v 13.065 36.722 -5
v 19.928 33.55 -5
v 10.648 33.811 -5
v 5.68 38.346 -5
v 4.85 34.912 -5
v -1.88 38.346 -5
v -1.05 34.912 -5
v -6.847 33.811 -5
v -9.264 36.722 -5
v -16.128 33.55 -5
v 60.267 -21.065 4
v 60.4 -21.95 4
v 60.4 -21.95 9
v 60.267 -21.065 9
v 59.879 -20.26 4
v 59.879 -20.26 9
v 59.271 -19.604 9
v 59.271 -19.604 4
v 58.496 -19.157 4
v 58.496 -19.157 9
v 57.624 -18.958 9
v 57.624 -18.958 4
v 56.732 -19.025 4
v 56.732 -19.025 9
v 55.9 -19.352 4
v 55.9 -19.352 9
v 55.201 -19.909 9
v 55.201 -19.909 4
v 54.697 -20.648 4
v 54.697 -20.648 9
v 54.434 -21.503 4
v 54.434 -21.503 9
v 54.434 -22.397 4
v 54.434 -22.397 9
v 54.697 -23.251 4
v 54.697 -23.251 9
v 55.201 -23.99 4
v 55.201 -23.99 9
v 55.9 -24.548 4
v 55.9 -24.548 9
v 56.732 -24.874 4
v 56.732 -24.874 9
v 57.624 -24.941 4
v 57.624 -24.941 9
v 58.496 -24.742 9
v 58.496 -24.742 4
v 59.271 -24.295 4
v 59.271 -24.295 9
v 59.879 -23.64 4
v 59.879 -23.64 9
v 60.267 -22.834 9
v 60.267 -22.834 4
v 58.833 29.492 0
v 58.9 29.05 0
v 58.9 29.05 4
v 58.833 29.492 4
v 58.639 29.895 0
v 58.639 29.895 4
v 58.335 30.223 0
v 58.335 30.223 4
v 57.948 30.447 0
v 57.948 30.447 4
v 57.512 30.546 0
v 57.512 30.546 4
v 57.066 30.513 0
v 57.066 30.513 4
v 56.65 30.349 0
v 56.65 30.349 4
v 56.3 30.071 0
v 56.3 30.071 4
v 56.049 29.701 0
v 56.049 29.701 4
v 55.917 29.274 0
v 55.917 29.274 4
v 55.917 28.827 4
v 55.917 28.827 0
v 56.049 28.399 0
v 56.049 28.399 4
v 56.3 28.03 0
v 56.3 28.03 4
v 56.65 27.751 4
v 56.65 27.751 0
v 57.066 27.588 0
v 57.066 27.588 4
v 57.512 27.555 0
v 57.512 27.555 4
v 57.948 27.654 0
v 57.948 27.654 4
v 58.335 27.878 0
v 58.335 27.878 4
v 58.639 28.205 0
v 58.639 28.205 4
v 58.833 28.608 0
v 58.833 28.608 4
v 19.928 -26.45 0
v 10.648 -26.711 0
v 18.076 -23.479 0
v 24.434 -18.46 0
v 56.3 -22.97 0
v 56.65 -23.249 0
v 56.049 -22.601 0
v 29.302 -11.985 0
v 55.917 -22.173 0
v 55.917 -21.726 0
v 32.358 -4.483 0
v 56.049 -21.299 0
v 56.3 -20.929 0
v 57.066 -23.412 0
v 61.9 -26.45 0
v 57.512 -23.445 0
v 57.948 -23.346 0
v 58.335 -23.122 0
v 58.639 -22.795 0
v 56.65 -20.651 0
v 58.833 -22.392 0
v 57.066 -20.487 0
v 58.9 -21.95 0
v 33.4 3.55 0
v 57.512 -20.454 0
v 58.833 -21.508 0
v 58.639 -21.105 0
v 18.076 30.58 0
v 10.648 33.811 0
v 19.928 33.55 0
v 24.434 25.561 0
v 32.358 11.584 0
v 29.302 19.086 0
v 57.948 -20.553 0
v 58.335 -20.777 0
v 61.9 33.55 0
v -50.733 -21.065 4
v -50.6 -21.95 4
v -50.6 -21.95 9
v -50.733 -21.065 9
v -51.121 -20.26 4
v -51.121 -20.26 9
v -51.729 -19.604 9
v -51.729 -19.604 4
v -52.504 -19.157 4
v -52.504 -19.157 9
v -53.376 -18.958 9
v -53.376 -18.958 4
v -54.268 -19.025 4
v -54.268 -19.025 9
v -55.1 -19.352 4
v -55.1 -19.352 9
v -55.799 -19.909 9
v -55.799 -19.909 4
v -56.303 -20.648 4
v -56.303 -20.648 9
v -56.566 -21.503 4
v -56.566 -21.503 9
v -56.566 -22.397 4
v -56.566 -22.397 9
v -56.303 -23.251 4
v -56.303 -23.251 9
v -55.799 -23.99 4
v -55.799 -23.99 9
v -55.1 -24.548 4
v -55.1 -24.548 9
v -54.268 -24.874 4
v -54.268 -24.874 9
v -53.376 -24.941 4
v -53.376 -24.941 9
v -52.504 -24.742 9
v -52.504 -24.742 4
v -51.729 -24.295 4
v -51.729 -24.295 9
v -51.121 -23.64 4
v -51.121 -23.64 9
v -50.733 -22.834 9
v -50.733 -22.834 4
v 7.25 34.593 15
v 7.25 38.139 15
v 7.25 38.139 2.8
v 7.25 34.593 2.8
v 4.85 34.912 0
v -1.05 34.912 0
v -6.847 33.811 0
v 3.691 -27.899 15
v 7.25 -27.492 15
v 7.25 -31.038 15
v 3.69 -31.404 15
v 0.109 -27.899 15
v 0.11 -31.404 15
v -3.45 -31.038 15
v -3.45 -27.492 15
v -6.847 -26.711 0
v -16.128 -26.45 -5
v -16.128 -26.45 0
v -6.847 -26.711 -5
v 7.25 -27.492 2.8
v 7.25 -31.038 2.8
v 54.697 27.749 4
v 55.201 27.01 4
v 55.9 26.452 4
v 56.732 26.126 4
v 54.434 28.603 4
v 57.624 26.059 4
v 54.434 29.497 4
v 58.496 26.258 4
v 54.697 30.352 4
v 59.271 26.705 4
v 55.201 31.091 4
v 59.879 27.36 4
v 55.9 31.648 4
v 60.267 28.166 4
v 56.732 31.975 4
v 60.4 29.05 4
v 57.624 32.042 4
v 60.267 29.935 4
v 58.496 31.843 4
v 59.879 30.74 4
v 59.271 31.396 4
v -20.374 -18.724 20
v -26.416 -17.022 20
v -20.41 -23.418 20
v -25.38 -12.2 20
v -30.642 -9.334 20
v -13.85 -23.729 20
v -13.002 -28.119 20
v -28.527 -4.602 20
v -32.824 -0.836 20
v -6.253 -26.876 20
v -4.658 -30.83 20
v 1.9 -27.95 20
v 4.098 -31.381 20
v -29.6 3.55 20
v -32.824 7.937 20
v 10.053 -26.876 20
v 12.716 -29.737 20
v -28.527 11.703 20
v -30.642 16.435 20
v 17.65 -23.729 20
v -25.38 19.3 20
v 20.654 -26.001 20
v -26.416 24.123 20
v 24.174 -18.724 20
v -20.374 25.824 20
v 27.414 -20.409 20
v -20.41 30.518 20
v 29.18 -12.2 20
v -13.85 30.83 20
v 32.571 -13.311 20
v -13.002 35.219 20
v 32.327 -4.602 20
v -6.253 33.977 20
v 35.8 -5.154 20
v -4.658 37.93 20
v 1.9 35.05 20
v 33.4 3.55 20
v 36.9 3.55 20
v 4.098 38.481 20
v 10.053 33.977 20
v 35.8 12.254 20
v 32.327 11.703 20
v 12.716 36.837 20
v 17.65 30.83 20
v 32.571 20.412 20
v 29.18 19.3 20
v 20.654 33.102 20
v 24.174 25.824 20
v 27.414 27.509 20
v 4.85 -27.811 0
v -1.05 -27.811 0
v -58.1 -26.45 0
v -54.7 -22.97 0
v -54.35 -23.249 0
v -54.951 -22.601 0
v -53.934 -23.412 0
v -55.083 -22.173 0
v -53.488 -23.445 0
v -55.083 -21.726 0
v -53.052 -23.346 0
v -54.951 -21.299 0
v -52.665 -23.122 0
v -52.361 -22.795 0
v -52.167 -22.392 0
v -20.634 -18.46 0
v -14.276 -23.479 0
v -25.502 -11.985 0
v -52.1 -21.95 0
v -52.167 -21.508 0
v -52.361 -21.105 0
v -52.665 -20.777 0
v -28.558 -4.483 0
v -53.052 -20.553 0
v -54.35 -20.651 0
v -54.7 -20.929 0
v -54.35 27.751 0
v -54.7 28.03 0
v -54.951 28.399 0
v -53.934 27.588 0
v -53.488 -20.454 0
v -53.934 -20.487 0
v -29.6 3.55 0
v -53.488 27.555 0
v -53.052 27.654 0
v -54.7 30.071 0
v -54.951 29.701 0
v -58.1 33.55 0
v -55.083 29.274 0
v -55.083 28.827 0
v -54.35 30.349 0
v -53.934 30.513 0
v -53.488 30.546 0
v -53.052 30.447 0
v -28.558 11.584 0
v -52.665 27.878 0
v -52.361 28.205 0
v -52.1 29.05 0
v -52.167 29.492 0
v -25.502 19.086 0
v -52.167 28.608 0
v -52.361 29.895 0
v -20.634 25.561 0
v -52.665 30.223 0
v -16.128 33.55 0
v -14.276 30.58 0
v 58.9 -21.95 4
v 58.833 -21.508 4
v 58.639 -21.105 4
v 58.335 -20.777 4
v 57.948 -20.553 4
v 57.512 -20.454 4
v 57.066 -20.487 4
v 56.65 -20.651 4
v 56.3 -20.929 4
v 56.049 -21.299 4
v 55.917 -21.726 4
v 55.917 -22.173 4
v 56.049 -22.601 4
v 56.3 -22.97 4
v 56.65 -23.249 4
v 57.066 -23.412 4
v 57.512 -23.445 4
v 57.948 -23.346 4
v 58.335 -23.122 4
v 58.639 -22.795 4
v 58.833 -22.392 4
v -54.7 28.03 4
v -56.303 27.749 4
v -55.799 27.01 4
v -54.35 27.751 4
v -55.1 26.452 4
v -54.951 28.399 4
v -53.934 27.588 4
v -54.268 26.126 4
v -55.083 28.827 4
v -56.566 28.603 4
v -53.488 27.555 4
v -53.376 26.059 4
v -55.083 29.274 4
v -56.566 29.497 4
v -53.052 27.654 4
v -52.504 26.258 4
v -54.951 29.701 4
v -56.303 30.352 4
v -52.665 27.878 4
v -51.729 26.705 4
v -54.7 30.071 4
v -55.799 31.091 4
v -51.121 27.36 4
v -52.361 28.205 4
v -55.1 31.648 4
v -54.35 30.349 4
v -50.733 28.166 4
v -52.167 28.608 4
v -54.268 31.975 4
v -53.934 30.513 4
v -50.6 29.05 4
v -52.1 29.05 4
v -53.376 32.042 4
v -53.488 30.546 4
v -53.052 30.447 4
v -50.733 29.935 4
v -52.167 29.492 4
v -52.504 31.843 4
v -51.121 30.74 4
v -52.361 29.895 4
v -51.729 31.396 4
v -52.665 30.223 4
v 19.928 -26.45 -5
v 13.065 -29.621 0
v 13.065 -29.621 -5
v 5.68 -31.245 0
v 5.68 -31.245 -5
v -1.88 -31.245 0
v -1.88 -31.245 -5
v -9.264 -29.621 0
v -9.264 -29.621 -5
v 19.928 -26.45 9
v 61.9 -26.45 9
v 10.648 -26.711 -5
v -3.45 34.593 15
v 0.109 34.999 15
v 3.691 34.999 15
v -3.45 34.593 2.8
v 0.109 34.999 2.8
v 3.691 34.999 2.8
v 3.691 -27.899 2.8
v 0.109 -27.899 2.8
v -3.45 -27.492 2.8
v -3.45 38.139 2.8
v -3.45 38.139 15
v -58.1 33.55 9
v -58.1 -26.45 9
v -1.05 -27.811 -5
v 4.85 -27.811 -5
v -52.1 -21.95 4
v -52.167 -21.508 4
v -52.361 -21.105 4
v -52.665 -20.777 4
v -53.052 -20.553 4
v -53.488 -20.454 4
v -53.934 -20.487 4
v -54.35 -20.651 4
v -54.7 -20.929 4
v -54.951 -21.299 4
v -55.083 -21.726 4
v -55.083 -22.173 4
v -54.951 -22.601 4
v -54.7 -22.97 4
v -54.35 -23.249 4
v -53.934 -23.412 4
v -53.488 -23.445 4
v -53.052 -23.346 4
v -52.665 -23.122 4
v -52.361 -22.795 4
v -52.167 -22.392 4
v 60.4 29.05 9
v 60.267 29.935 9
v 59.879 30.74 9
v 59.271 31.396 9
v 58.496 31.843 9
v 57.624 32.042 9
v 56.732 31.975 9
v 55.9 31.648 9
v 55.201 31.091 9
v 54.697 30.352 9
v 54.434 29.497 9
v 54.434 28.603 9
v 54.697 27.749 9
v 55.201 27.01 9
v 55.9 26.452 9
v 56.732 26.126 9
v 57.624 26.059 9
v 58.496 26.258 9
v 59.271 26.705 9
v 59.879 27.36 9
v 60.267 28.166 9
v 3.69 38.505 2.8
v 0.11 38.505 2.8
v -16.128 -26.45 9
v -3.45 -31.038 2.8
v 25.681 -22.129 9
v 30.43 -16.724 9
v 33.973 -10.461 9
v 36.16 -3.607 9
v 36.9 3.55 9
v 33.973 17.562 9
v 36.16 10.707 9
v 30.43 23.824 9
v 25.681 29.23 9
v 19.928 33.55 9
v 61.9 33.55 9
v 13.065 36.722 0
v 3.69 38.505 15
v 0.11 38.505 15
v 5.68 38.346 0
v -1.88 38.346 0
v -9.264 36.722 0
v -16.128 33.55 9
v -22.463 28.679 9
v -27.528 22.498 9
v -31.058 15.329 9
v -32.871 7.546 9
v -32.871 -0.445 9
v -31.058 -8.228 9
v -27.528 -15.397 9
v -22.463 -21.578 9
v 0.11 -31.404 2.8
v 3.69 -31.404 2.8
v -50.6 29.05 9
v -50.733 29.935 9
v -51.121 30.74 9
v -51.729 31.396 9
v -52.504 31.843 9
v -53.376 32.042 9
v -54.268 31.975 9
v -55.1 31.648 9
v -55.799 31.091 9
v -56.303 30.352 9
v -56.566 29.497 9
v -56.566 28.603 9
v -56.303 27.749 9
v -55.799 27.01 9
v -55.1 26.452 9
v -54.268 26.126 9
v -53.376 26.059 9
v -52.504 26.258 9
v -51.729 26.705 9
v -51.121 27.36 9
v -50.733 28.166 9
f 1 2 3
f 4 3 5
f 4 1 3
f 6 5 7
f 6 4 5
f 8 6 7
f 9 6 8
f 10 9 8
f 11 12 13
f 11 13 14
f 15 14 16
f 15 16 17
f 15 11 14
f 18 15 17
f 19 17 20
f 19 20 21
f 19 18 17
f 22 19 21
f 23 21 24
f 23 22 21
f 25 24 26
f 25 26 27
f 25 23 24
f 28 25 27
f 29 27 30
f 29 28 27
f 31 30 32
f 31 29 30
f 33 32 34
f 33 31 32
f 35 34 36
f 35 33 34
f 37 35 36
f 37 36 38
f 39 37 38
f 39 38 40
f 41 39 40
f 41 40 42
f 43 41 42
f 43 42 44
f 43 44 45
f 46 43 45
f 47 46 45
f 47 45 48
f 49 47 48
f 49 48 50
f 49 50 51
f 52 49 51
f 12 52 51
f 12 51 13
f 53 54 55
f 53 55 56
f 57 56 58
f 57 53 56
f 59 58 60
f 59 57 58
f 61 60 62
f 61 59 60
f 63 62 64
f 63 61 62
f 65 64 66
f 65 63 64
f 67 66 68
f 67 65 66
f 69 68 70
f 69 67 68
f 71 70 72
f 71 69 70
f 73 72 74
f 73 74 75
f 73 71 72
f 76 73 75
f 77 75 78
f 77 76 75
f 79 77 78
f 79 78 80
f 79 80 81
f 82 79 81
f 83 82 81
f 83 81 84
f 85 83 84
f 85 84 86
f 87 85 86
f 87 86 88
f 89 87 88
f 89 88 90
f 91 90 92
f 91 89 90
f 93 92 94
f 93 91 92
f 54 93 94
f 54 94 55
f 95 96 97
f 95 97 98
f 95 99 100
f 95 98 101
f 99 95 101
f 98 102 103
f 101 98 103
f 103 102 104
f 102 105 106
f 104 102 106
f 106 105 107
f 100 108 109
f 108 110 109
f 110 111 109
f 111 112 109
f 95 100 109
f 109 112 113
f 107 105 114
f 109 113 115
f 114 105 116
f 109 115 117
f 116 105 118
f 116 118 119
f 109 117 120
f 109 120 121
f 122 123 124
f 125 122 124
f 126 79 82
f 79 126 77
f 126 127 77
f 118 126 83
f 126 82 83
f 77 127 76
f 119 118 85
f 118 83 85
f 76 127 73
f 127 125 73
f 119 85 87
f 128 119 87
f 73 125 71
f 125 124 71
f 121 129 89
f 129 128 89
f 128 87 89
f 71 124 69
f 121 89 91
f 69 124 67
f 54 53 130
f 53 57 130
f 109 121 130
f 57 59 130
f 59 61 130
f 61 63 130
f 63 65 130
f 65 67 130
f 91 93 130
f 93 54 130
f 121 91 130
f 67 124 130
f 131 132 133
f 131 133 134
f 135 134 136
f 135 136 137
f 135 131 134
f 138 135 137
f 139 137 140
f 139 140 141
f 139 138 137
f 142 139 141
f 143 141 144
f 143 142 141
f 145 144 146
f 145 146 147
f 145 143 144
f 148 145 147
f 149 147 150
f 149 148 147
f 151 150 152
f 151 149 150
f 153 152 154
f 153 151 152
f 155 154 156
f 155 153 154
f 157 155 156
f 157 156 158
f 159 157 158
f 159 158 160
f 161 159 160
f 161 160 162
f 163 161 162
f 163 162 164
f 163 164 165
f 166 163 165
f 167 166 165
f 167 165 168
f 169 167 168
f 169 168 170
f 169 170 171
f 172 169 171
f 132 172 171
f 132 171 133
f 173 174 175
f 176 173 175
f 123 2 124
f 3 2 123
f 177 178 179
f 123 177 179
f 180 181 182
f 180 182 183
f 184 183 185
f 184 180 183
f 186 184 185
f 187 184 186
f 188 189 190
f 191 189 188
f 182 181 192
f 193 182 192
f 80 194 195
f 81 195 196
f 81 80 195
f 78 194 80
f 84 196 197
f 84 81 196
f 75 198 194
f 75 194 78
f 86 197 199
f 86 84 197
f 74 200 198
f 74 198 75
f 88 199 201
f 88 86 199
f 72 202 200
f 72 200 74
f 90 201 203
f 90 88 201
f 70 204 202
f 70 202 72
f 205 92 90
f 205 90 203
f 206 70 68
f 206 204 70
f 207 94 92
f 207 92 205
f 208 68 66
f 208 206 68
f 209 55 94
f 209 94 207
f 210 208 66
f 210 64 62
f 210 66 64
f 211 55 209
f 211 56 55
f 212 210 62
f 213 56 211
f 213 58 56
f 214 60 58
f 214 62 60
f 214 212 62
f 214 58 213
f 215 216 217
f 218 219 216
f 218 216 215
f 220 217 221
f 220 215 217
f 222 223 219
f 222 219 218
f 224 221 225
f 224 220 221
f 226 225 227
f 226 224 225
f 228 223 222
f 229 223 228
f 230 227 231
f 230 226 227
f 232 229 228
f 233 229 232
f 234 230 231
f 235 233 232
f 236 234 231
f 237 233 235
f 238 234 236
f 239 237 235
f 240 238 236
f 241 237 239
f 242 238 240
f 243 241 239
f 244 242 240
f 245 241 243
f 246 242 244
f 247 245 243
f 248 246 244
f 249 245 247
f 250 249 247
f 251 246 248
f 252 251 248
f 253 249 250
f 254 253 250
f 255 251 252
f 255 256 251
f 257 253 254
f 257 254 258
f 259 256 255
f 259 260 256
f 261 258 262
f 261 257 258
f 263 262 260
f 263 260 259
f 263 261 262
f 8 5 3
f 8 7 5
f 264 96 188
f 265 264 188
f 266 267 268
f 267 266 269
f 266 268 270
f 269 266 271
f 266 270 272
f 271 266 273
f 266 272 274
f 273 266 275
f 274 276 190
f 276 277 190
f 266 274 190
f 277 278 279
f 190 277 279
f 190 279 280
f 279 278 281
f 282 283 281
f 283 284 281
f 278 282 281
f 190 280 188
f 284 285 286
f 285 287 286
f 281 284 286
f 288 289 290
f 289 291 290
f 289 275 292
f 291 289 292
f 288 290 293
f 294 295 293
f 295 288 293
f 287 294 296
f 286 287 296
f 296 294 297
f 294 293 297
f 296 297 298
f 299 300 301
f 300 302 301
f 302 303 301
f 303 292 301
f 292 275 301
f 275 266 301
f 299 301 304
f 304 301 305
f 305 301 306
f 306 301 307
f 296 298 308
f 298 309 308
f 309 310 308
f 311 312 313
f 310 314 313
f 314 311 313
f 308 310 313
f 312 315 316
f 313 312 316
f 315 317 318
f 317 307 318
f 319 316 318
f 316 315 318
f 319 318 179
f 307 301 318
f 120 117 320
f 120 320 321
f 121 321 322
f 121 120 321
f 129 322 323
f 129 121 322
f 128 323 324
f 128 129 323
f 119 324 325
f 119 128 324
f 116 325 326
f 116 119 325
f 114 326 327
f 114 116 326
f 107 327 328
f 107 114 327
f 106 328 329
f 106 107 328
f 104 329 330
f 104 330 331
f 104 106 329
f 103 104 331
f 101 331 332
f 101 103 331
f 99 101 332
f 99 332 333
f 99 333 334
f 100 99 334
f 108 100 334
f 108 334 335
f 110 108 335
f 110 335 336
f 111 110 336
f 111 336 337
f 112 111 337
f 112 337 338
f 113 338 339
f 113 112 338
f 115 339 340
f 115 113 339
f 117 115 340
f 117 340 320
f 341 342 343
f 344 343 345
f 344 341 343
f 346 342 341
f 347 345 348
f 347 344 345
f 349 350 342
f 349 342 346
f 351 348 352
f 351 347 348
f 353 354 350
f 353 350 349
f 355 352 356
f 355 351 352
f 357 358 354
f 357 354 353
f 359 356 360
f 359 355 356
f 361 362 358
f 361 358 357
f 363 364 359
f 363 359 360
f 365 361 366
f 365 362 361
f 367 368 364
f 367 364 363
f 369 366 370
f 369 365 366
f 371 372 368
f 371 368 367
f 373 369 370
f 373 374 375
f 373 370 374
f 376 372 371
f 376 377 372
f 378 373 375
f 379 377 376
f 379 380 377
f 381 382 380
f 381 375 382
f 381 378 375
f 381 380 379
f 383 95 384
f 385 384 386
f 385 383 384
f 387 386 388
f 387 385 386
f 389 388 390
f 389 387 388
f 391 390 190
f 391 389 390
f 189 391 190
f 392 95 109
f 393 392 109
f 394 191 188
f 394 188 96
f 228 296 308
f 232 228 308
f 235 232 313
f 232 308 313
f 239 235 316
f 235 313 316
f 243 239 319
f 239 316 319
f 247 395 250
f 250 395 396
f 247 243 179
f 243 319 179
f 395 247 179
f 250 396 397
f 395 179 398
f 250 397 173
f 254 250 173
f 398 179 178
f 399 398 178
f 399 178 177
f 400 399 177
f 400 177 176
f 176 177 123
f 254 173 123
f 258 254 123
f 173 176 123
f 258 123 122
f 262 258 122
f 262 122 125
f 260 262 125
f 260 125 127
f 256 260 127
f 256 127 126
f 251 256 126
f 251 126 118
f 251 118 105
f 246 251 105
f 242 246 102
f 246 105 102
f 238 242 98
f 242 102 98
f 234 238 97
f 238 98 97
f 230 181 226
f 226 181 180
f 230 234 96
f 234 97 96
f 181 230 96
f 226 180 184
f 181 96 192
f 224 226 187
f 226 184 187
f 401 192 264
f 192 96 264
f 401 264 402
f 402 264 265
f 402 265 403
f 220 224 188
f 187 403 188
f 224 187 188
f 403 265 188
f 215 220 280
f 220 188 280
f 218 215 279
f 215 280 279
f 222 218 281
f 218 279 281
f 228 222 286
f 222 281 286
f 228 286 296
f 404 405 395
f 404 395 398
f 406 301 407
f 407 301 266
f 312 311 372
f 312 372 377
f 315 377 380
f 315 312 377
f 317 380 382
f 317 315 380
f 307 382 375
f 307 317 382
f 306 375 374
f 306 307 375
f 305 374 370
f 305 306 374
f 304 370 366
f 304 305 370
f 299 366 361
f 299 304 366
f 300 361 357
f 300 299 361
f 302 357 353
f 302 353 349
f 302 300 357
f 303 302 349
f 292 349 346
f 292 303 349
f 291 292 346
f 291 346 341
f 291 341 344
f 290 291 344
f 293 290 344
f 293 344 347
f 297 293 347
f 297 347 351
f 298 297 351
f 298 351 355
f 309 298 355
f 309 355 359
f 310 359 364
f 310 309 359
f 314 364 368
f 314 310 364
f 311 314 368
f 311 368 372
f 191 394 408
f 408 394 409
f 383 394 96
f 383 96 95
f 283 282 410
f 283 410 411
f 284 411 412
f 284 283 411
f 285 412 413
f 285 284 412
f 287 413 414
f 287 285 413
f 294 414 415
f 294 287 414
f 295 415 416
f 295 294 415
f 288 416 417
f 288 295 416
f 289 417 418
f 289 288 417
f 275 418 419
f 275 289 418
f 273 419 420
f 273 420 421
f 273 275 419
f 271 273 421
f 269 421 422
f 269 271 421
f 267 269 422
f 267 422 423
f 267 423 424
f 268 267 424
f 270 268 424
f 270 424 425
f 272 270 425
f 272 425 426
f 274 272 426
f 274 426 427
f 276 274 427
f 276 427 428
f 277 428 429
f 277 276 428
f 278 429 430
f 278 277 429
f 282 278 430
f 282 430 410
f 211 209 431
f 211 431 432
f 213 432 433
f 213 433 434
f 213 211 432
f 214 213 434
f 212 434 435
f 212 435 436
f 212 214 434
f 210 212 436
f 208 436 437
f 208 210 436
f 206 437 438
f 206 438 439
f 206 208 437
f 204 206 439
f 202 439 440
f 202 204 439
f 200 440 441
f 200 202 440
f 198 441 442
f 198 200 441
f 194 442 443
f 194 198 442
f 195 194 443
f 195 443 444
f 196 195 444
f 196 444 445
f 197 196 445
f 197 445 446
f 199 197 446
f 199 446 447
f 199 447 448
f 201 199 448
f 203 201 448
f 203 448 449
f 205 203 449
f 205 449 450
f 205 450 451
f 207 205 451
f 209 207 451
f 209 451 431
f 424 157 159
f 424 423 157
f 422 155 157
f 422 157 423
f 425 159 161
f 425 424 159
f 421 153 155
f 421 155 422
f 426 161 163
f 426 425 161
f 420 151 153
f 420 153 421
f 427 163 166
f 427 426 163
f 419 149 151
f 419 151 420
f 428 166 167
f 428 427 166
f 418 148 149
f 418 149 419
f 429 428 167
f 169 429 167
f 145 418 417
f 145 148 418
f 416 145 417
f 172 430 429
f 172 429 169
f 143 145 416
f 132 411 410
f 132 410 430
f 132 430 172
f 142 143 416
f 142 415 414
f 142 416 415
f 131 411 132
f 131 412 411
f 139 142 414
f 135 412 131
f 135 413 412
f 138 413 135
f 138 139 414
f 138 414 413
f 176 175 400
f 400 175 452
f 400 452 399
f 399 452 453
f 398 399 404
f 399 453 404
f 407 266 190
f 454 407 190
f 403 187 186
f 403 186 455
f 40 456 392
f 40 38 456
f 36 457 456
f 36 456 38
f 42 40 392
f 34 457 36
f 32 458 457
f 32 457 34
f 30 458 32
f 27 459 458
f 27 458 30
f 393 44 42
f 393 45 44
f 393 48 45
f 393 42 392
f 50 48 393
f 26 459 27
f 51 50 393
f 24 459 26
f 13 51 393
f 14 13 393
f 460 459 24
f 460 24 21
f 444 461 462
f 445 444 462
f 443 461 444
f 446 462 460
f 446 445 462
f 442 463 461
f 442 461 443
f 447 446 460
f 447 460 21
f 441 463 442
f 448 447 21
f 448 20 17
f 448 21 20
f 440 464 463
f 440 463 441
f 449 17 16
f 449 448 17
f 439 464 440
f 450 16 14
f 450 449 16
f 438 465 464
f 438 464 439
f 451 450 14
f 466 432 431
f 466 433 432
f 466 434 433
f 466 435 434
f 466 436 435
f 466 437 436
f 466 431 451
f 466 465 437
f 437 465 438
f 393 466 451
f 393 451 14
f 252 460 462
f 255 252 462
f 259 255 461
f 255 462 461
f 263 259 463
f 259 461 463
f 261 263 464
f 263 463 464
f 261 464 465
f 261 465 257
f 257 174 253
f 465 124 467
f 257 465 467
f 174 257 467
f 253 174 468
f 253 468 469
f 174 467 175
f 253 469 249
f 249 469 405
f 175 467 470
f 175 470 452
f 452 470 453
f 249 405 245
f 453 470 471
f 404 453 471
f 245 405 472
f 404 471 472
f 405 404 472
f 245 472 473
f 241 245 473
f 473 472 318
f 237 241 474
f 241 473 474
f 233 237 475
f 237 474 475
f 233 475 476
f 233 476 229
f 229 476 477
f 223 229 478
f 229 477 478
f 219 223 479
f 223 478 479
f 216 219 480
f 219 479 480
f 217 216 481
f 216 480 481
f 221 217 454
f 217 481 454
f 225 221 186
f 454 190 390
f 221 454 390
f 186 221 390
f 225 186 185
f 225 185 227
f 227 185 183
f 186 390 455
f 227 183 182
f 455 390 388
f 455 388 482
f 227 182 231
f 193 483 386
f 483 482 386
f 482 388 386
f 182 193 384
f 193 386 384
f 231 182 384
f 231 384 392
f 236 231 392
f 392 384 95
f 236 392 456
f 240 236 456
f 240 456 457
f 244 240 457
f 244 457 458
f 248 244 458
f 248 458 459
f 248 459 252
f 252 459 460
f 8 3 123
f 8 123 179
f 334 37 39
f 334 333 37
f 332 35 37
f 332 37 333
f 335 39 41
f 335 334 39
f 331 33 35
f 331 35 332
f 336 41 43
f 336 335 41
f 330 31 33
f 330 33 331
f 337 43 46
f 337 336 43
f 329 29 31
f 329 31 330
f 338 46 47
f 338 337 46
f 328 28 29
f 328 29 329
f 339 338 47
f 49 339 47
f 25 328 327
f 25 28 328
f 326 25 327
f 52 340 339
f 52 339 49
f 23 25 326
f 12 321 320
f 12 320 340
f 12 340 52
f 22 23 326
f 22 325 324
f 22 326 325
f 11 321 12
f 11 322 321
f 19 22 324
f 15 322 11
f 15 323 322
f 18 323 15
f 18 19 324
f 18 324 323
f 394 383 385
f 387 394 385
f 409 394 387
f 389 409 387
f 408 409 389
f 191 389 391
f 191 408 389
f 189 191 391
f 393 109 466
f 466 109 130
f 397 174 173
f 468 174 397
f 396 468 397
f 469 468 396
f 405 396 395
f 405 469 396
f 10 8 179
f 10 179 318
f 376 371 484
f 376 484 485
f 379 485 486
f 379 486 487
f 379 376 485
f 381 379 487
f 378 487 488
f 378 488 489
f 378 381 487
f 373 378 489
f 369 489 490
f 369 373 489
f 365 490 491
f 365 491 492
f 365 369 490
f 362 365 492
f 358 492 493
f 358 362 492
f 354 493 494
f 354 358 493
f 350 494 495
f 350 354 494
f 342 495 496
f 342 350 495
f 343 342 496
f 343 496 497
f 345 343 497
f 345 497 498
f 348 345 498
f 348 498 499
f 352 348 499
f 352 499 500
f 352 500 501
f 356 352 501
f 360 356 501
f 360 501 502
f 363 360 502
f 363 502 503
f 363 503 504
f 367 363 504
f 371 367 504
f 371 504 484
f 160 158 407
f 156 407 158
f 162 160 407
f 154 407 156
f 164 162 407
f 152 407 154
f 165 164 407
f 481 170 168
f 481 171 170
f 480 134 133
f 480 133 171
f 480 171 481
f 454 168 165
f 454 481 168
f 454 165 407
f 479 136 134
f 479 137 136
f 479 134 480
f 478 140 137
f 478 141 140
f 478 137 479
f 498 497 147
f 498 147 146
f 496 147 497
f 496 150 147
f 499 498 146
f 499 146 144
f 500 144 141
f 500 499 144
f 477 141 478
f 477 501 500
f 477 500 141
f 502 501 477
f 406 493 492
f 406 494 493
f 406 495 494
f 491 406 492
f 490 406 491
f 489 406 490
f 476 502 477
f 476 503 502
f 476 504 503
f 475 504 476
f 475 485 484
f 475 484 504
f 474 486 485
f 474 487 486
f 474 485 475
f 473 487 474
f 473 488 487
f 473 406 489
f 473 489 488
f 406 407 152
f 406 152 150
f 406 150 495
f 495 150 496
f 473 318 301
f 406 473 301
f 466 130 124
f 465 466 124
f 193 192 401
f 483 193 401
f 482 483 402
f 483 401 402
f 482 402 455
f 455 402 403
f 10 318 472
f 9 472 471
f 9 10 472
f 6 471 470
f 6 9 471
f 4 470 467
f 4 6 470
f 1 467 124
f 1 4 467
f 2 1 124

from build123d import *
from build123d.topology import SkipClean

# Parameters (mm, degrees)
SKETCH1_R               = 33.5
BOSS_EXTRUDE1_DEPTH     = 20
SKETCH1_5_R             = 3
SKETCH1_5_R_2           = 1.5
BOSS_EXTRUDE3_DEPTH     = 4
BOSS_EXTRUDE3_2_DEPTH   = 4
BOSS_EXTRUDE3_3_DEPTH   = 4
BOSS_EXTRUDE3_4_DEPTH   = 4
SKETCH1_6_R             = 3
BOSS_EXTRUDE4_DEPTH     = 9
CUT_EXTRUDE2_DEPTH      = 22
CUT_EXTRUDE2_DEPTH_BACK = 76
SKETCH3_W               = 10.7
SKETCH3_H               = 12.2
SKETCH5_R               = 35
SKETCH5_R_2             = 31.5
BOSS_EXTRUDE9_DEPTH     = 20
BOSS_EXTRUDE11_START    = 5
BOSS_EXTRUDE11_DEPTH    = 5
CUT_EXTRUDE3_DEPTH      = 22
CUT_EXTRUDE3_DEPTH_BACK = 92
SKETCH3_2_W             = 10.7
SKETCH3_2_H             = 12.2


with BuildPart() as part:
    # Sketch1 → Boss-Extrude1 (new body)
    with BuildSketch(Plane.XY):
        with BuildLine():
            ThreePointArc((19.927805895, 33.550317981), (1.900049518, 38.550317981), (-16.12770686, 33.550317981))
            ThreePointArc((-16.12770686, 33.550317981), (-33.099950482, 3.550317981), (-16.12770686, -26.449682019))
            ThreePointArc((-16.12770686, -26.449682019), (1.900049518, -31.449682019), (19.927805895, -26.449682019))
            ThreePointArc((19.927805895, -26.449682019), (32.362907831, -13.683783776), (36.900049518, 3.550317981))
            ThreePointArc((36.900049518, 3.550317981), (32.362907831, 20.784419739), (19.927805895, 33.550317981))
        make_face()
        with Locations((1.900049518, 3.550317981)):
            Circle(SKETCH1_R, mode=Mode.SUBTRACT)
    extrude(amount=BOSS_EXTRUDE1_DEPTH)



with BuildPart() as body_2:
    # Sketch1<5> → Boss-Extrude3 (new body)
    with BuildSketch(Plane.XY):
        with Locations((-53.599950482, -21.949682019)):
            Circle(SKETCH1_5_R)
        with Locations((-53.599950482, -21.949682019)):
            Circle(SKETCH1_5_R_2, mode=Mode.SUBTRACT)
    extrude(amount=BOSS_EXTRUDE3_DEPTH)


with BuildPart() as body_3:
    # Sketch1<5> → Boss-Extrude3 2 (new body)
    with BuildSketch(Plane.XY):
        with Locations((-53.599950482, 29.050317981)):
            Circle(SKETCH1_5_R)
        with Locations((-53.599950482, 29.050317981)):
            Circle(SKETCH1_5_R_2, mode=Mode.SUBTRACT)
    extrude(amount=BOSS_EXTRUDE3_2_DEPTH)


with BuildPart() as body_4:
    # Sketch1<5> → Boss-Extrude3 3 (new body)
    with BuildSketch(Plane.XY):
        with Locations((57.400049518, 29.050317981)):
            Circle(SKETCH1_5_R)
        with Locations((57.400049518, 29.050317981)):
            Circle(SKETCH1_5_R_2, mode=Mode.SUBTRACT)
    extrude(amount=BOSS_EXTRUDE3_3_DEPTH)


with BuildPart() as body_5:
    # Sketch1<5> → Boss-Extrude3 4 (new body)
    with BuildSketch(Plane.XY):
        with Locations((57.400049518, -21.949682019)):
            Circle(SKETCH1_5_R)
        with Locations((57.400049518, -21.949682019)):
            Circle(SKETCH1_5_R_2, mode=Mode.SUBTRACT)
    extrude(amount=BOSS_EXTRUDE3_4_DEPTH)


with BuildPart() as part_1:
    add(part.part)

    add(body_2.part)  # Boss-Extrude4 merges body 2

    add(body_3.part)  # Boss-Extrude4 merges body 3

    add(body_4.part)  # Boss-Extrude4 merges body 4

    add(body_5.part)  # Boss-Extrude4 merges body 5
    # Sketch1<6> → Boss-Extrude4 (add)
    # profile 1 of 2: a face of its own
    with BuildSketch(Plane.XY):
        with BuildLine():
            Line((-16.12770686, 33.550317981), (-58.099950482, 33.550317981))
            Line((-58.099950482, 33.550317981), (-58.099950482, -26.449682019))
            Line((-58.099950482, -26.449682019), (-16.12770686, -26.449682019))
            ThreePointArc((-16.12770686, -26.449682019), (-33.099950482, 3.550317981), (-16.12770686, 33.550317981))
        make_face()
        with Locations((-53.599950482, -21.949682019)):
            Circle(SKETCH1_6_R, mode=Mode.SUBTRACT)
        with Locations((-53.599950482, 29.050317981)):
            Circle(SKETCH1_6_R, mode=Mode.SUBTRACT)
    # profile 2 of 2: a face of its own
    with BuildSketch(Plane.XY):
        with BuildLine():
            Line((61.900049518, 33.550317981), (19.927805895, 33.550317981))
            ThreePointArc((19.927805895, 33.550317981), (36.900049518, 3.550317981), (19.927805895, -26.449682019))
            Line((19.927805895, -26.449682019), (61.900049518, -26.449682019))
            Line((61.900049518, -26.449682019), (61.900049518, 33.550317981))
        make_face()
        with Locations((57.400049518, -21.949682019)):
            Circle(SKETCH1_6_R, mode=Mode.SUBTRACT)
        with Locations((57.400049518, 29.050317981)):
            Circle(SKETCH1_6_R, mode=Mode.SUBTRACT)
    extrude(amount=BOSS_EXTRUDE4_DEPTH)

    # Sketch3 → Cut-Extrude2 (cut, two sides: drawn at the far end of the back side and taken through both)
    with BuildSketch(Plane(origin=(0, -26.449682019, 0), x_dir=(-1, 0, 0), z_dir=(0, -1, 0)).offset(-CUT_EXTRUDE2_DEPTH_BACK)):
        with Locations((-1.900049518, -8.9)):
            Rectangle(SKETCH3_W, SKETCH3_H)
    extrude(amount=CUT_EXTRUDE2_DEPTH + CUT_EXTRUDE2_DEPTH_BACK, mode=Mode.SUBTRACT)

    # Sketch5 → Boss-Extrude9 (add)
    with BuildSketch(Plane(origin=(0, 0, 0), x_dir=(-1, 0, 0), z_dir=(0, 0, -1))):
        with Locations((-1.900049518, 3.550317981)):
            Circle(SKETCH5_R)
        with Locations((-1.900049518, 3.550317981)):
            Circle(SKETCH5_R_2, mode=Mode.SUBTRACT)
    extrude(amount=-BOSS_EXTRUDE9_DEPTH)

    # Sketch5<11> → Boss-Extrude11 (add)
    with SkipClean():  # the faces are left unmerged after this step: merging them gives an invalid solid
        with BuildSketch(Plane(origin=(0, 0, 0), x_dir=(-1, 0, 0), z_dir=(0, 0, -1)).offset(BOSS_EXTRUDE11_START)):
            with BuildLine():
                ThreePointArc((-19.927805895, -26.449682019), (-1.900049518, -31.449682019), (16.12770686, -26.449682019))
                Line((16.12770686, -26.449682019), (6.84749343, -26.710721201))
                Line((6.84749343, -26.710721201), (-10.647592465, -26.710721201))
                Line((-10.647592465, -26.710721201), (-19.927805895, -26.449682019))
            make_face()
            with BuildLine():
                ThreePointArc((16.12770686, 33.550317981), (-1.900049518, 38.550317981), (-19.927805895, 33.550317981))
                Line((-19.927805895, 33.550317981), (-10.647592465, 33.811357163))
                Line((-10.647592465, 33.811357163), (6.84749343, 33.811357163))
                Line((6.84749343, 33.811357163), (16.12770686, 33.550317981))
            make_face()
        extrude(amount=-BOSS_EXTRUDE11_DEPTH)

    # Sketch3<2> → Cut-Extrude3 (cut, two sides: drawn at the far end of the back side and taken through both)
    with SkipClean():  # the faces are left unmerged after this step: merging them gives an invalid solid
        with BuildSketch(Plane(origin=(0, -26.449682019, 0), x_dir=(-1, 0, 0), z_dir=(0, -1, 0)).offset(-CUT_EXTRUDE3_DEPTH_BACK)):
            with Locations((-1.900049518, -8.9)):
                Rectangle(SKETCH3_2_W, SKETCH3_2_H)
        extrude(amount=CUT_EXTRUDE3_DEPTH + CUT_EXTRUDE3_DEPTH_BACK, mode=Mode.SUBTRACT)


solid = part_1.part
